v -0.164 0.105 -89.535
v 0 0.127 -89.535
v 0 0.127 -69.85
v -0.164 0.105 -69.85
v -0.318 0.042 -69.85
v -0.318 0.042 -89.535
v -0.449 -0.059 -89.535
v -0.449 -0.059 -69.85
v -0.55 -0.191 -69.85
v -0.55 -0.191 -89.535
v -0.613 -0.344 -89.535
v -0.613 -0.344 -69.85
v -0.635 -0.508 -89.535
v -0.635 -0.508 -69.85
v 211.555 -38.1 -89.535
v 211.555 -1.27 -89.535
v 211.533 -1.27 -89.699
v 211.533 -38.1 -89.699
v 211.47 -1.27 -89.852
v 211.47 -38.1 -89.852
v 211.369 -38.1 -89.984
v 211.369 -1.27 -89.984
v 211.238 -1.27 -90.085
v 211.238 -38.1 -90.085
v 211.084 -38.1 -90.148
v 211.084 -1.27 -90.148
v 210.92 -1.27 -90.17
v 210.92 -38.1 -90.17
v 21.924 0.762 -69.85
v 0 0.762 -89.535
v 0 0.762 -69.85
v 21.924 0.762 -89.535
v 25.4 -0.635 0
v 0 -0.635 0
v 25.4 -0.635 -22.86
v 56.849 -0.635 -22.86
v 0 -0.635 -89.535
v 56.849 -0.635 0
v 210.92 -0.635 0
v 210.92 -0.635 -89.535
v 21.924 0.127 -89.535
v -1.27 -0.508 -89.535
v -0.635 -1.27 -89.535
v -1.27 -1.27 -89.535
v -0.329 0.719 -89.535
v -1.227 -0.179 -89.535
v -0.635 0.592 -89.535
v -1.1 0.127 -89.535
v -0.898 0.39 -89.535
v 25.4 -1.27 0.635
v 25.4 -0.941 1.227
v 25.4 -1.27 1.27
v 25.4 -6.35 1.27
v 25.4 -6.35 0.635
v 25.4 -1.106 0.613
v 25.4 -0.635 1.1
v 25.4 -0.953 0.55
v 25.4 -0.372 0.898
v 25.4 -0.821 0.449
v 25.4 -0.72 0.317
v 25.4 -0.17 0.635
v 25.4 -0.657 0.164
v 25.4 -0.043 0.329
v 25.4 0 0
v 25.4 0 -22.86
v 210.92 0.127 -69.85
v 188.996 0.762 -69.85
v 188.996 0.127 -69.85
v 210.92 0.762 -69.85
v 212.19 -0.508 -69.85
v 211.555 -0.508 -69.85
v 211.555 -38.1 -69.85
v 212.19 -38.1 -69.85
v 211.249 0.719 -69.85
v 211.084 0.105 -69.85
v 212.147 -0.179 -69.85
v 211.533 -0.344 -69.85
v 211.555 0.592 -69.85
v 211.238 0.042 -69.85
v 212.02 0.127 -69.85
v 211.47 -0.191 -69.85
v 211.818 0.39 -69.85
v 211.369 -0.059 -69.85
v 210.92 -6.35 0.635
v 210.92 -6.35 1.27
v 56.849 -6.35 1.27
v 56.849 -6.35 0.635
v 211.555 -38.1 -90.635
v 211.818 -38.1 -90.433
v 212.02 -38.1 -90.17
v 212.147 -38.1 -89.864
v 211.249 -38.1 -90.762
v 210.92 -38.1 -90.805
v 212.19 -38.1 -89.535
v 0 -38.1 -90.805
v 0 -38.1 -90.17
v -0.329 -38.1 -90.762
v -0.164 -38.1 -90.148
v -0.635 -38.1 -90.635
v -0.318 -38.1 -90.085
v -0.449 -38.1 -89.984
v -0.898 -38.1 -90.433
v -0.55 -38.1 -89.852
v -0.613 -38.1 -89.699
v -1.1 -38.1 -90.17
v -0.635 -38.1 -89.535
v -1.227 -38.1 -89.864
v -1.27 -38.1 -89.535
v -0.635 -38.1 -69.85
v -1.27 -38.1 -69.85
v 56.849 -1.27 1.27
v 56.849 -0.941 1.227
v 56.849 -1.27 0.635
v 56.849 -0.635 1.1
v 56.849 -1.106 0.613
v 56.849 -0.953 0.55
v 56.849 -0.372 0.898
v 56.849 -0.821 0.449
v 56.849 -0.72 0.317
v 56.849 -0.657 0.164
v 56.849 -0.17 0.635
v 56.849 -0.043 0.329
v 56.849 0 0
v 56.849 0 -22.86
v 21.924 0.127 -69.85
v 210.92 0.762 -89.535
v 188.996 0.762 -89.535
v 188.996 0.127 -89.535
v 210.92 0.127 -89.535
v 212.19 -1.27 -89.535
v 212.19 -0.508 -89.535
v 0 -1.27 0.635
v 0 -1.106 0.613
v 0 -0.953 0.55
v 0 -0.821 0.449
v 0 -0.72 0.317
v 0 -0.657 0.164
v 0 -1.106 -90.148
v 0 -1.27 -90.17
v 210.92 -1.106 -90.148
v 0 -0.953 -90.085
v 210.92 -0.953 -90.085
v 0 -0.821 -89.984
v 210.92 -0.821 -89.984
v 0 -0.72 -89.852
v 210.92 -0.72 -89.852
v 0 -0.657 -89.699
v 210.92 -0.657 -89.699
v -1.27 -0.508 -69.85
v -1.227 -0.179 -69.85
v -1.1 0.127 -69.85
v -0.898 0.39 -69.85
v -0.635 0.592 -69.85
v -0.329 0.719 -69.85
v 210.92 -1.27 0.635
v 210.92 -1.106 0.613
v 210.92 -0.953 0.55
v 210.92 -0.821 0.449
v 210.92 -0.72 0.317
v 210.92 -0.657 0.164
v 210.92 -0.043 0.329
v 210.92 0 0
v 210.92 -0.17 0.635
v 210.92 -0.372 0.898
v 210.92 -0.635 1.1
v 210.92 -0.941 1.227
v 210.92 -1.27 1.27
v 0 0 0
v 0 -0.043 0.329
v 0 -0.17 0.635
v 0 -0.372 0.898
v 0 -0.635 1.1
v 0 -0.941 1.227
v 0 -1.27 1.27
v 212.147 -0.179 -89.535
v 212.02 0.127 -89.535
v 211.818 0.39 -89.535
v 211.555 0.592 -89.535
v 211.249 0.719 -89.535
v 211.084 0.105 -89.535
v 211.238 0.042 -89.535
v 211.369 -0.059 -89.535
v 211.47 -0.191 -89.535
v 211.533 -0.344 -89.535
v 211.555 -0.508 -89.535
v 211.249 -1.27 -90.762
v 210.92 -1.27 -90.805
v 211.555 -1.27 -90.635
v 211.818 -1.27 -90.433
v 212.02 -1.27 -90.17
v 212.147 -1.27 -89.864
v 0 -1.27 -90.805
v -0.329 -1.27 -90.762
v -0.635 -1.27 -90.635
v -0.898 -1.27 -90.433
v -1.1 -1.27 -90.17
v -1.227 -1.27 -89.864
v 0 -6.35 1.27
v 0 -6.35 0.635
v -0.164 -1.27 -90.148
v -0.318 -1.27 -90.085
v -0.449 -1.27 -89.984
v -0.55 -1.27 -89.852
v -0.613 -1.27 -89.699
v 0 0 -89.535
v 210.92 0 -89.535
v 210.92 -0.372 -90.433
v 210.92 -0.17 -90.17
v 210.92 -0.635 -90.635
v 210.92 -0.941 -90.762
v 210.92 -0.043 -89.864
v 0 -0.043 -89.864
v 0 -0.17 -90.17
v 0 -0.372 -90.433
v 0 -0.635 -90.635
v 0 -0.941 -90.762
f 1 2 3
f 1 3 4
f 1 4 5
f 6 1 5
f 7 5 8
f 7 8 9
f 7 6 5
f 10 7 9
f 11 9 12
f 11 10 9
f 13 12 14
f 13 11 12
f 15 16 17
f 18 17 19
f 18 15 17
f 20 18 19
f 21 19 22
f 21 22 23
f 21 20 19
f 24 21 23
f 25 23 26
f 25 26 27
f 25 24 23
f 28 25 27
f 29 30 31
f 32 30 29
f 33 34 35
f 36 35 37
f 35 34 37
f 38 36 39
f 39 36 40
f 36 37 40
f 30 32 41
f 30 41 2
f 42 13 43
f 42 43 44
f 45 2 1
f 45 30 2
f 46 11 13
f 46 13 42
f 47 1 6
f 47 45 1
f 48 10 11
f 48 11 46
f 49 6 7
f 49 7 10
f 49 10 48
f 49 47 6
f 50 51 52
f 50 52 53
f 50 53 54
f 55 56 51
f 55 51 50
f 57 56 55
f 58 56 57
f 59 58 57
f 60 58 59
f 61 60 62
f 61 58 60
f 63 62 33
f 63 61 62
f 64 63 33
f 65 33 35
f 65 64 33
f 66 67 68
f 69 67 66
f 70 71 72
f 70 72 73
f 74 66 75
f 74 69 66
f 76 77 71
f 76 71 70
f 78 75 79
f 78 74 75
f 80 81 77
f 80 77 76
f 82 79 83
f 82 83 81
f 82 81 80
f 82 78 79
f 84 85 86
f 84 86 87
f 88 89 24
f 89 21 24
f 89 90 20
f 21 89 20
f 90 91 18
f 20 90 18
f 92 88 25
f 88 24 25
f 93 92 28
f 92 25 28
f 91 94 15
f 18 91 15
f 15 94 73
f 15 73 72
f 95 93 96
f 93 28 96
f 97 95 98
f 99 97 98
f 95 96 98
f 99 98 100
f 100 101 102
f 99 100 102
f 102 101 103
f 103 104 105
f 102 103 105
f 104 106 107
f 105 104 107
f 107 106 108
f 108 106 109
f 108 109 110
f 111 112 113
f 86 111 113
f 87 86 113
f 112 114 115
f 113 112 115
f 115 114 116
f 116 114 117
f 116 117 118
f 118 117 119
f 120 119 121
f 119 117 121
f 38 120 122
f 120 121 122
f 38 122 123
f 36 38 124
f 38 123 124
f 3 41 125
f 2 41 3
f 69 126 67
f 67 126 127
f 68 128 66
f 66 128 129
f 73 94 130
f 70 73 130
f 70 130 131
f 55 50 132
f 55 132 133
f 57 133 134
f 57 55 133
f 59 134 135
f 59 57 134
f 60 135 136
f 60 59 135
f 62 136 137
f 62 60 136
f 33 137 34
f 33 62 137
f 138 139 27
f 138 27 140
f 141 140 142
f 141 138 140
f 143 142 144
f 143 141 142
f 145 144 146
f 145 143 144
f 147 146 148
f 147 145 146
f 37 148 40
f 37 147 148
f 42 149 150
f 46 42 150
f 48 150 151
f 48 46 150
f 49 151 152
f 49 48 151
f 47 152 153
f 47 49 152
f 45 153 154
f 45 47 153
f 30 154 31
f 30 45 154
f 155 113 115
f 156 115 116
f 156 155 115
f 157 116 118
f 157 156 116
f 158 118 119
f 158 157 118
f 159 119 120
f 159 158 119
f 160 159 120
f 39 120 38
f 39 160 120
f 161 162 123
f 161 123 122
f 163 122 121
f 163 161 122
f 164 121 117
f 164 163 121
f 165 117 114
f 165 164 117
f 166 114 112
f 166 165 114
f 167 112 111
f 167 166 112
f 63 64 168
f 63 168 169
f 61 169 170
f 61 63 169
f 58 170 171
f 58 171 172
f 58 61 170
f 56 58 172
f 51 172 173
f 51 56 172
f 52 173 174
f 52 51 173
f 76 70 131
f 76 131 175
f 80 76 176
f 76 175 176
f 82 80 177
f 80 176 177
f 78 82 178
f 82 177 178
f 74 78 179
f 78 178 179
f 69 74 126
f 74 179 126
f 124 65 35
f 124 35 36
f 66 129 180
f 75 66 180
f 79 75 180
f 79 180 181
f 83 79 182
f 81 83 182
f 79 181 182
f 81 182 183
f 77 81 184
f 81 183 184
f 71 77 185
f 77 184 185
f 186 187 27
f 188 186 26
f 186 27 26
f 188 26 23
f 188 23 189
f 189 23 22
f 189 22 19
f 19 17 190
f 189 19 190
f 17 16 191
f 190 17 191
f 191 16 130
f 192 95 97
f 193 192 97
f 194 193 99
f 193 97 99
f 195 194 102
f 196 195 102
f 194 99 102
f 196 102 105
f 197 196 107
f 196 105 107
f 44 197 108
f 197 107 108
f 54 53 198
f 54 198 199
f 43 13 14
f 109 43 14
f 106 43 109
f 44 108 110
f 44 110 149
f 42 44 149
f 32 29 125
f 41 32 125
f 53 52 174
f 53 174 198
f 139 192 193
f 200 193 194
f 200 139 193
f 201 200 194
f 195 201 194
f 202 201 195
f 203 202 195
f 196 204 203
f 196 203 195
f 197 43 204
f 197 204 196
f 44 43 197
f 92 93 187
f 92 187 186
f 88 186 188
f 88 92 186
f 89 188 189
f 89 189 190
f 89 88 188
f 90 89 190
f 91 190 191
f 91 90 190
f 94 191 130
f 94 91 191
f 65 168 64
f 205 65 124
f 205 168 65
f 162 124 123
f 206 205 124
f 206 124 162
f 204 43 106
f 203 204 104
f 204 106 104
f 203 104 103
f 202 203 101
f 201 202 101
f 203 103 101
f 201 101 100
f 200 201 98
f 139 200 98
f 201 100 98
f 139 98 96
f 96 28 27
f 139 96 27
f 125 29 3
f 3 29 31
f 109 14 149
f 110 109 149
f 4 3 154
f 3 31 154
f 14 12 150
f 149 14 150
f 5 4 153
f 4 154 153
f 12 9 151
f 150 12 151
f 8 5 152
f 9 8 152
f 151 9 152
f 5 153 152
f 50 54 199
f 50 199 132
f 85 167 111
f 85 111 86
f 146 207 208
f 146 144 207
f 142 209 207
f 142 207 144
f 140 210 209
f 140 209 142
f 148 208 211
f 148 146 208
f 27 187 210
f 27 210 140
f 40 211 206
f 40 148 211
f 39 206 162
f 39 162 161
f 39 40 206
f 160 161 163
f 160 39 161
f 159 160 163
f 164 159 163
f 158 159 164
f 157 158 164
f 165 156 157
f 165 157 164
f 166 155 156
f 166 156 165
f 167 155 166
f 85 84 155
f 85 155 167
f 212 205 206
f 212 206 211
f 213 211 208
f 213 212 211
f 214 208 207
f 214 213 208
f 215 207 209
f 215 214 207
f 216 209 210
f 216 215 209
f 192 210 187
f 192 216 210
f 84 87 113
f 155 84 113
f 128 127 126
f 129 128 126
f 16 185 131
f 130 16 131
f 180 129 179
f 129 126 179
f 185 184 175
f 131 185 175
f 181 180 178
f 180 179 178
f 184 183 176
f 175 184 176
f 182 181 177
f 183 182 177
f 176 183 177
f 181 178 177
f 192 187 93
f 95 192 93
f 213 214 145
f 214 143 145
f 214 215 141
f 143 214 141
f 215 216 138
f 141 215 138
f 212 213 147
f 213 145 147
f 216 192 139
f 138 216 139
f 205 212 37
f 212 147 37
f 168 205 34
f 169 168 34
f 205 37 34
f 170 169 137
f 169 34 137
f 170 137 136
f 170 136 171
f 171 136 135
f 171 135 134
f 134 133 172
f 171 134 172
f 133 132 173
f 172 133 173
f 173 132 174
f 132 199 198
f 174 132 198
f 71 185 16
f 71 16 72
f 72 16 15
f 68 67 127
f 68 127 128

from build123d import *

# Parameters (mm, degrees)
SKETCH2_W                    = 210.920124673
SKETCH2_H                    = 90.17
BASE_FLANGE1_DEPTH           = 0.635
EDGE_FLANGE1_STRIP_W         = 3.81
EDGE_FLANGE1_STRIP_H         = 0.635
EDGE_FLANGE1_STRIP_CUT_DEPTH = 210.920124673
EDGE_FLANGE1_DEPTH           = 210.920124673
EDGE_FLANGE4_DEPTH           = 36.83
EDGE_FLANGE7_START           = -89.535
EDGE_FLANGE7_DEPTH           = 19.685
EDGE_FLANGE8_DEPTH           = 210.920124673
CUT_EXTRUDE1_REACH           = 235.927
SKETCH41_W                   = 31.449187445
SKETCH41_H                   = 25.469780901


# Read off the part's stored shape, not the designer's step: Edge-Flange7
# Sheet-metal steps are written as plain solids
with BuildPart() as part:
    # Sketch2 → Base-Flange1 (new body)
    with BuildSketch(Plane(origin=(0, 0, 0), x_dir=(1, 0, 0), z_dir=(0, 1, 0))):
        with Locations((105.460062337, 45.085)):
            Rectangle(SKETCH2_W, SKETCH2_H)
    extrude(amount=-BASE_FLANGE1_DEPTH)

    # Edge-Flange1 strip (across the edge) → Edge-Flange1 strip cut (cut)
    with BuildSketch(Plane(origin=(0, -0.635, -90.17), x_dir=(0, 0, 1), z_dir=(1, 0, 0))):
        with Locations((-1.27, -0.3175)):
            Rectangle(EDGE_FLANGE1_STRIP_W, EDGE_FLANGE1_STRIP_H)
    extrude(amount=EDGE_FLANGE1_STRIP_CUT_DEPTH, mode=Mode.SUBTRACT)

    # Edge-Flange1 section (across the edge) → Edge-Flange1 (add)
    with BuildSketch(Plane(origin=(0, -0.635, -90.17), x_dir=(0, 0, 1), z_dir=(1, 0, 0))):
        with BuildLine():
            Line((-0.635, 0.635), (-0.635, 37.465))
            Line((-0.635, 37.465), (0, 37.465))
            Line((0, 37.465), (0, 0.635))
            ThreePointArc((0, 0.635), (0.185987194, 0.185987194), (0.635, 0))
            Line((0.635, 0), (0.635, -0.635))
            ThreePointArc((0.635, -0.635), (-0.263025612, -0.263025612), (-0.635, 0.635))
        make_face()
    extrude(amount=EDGE_FLANGE1_DEPTH)

    # Edge-Flange4 section (across the edge) → Edge-Flange4 (add)
    with BuildSketch(Plane(origin=(211.555124673, -38.1, -90.17), x_dir=(-1, 0, 0), z_dir=(0, 1, 0))):
        with BuildLine():
            Line((-0.635, 0.635), (-0.635, 20.32))
            Line((-0.635, 20.32), (0, 20.32))
            Line((0, 20.32), (0, 0.635))
            ThreePointArc((0, 0.635), (0.185987194, 0.185987194), (0.635, 0))
            Line((0.635, 0), (0.635, -0.635))
            ThreePointArc((0.635, -0.635), (-0.263025612, -0.263025612), (-0.635, 0.635))
        make_face()
    edge_flange4 = extrude(amount=EDGE_FLANGE4_DEPTH)

    # Edge-Flange7 outline → Edge-Flange7 (add)
    with BuildSketch(Plane.XY.offset(EDGE_FLANGE7_START)):
        with BuildLine():
            ThreePointArc((212.190124673, -0.508), (211.818150285, 0.390025612), (210.920124673, 0.762))
            Line((210.920124673, 0.762), (188.995937227, 0.762))
            Line((188.995937227, 0.762), (188.995937227, 0.127))
            Line((188.995937227, 0.127), (210.920124673, 0.127))
            ThreePointArc((210.920124673, 0.127), (211.369137479, -0.058987194), (211.555124673, -0.508))
            Line((211.555124673, -0.508), (211.555124673, -1.27))
            Line((211.555124673, -1.27), (212.190124673, -1.27))
            Line((212.190124673, -1.27), (212.190124673, -0.508))
        make_face()
    edge_flange7 = extrude(amount=EDGE_FLANGE7_DEPTH)

    # Mirror1: Edge-Flange4, Edge-Flange7 across plane
    add(edge_flange4.mirror(Plane.ZY.offset(-105.460062336)))
    add(edge_flange7.mirror(Plane.ZY.offset(-105.460062336)))

    # Edge-Flange8 section (across the edge) → Edge-Flange8 (add)
    with BuildSketch(Plane(origin=(210.920124673, -0.635, 0.635), x_dir=(0, 0, -1), z_dir=(-1, 0, 0))):
        with BuildLine():
            Line((-0.635, 0.635), (-0.635, 5.715))
            Line((-0.635, 5.715), (0, 5.715))
            Line((0, 5.715), (0, 0.635))
            ThreePointArc((0, 0.635), (0.185987194, 0.185987194), (0.635, 0))
            Line((0.635, 0), (0.635, -0.635))
            ThreePointArc((0.635, -0.635), (-0.263025612, -0.263025612), (-0.635, 0.635))
        make_face()
    extrude(amount=EDGE_FLANGE8_DEPTH)

    # Sketch41 → Cut-Extrude1 (cut, up to next)
    with BuildSketch(Plane(origin=(0, 0, 0), x_dir=(1, 0, 0), z_dir=(0, 1, 0)), mode=Mode.PRIVATE) as cut_extrude1_sk1:
        with Locations((41.124593723, 10.12510955)):
            Rectangle(SKETCH41_W, SKETCH41_H)
    cut_extrude1_tool1 = extrude(cut_extrude1_sk1.sketch, amount=-CUT_EXTRUDE1_REACH, mode=Mode.PRIVATE) & part.part
    add(cut_extrude1_tool1.solids().sort_by_distance((41.124594, 0, -10.12511))[0], mode=Mode.SUBTRACT)


solid = part.part
